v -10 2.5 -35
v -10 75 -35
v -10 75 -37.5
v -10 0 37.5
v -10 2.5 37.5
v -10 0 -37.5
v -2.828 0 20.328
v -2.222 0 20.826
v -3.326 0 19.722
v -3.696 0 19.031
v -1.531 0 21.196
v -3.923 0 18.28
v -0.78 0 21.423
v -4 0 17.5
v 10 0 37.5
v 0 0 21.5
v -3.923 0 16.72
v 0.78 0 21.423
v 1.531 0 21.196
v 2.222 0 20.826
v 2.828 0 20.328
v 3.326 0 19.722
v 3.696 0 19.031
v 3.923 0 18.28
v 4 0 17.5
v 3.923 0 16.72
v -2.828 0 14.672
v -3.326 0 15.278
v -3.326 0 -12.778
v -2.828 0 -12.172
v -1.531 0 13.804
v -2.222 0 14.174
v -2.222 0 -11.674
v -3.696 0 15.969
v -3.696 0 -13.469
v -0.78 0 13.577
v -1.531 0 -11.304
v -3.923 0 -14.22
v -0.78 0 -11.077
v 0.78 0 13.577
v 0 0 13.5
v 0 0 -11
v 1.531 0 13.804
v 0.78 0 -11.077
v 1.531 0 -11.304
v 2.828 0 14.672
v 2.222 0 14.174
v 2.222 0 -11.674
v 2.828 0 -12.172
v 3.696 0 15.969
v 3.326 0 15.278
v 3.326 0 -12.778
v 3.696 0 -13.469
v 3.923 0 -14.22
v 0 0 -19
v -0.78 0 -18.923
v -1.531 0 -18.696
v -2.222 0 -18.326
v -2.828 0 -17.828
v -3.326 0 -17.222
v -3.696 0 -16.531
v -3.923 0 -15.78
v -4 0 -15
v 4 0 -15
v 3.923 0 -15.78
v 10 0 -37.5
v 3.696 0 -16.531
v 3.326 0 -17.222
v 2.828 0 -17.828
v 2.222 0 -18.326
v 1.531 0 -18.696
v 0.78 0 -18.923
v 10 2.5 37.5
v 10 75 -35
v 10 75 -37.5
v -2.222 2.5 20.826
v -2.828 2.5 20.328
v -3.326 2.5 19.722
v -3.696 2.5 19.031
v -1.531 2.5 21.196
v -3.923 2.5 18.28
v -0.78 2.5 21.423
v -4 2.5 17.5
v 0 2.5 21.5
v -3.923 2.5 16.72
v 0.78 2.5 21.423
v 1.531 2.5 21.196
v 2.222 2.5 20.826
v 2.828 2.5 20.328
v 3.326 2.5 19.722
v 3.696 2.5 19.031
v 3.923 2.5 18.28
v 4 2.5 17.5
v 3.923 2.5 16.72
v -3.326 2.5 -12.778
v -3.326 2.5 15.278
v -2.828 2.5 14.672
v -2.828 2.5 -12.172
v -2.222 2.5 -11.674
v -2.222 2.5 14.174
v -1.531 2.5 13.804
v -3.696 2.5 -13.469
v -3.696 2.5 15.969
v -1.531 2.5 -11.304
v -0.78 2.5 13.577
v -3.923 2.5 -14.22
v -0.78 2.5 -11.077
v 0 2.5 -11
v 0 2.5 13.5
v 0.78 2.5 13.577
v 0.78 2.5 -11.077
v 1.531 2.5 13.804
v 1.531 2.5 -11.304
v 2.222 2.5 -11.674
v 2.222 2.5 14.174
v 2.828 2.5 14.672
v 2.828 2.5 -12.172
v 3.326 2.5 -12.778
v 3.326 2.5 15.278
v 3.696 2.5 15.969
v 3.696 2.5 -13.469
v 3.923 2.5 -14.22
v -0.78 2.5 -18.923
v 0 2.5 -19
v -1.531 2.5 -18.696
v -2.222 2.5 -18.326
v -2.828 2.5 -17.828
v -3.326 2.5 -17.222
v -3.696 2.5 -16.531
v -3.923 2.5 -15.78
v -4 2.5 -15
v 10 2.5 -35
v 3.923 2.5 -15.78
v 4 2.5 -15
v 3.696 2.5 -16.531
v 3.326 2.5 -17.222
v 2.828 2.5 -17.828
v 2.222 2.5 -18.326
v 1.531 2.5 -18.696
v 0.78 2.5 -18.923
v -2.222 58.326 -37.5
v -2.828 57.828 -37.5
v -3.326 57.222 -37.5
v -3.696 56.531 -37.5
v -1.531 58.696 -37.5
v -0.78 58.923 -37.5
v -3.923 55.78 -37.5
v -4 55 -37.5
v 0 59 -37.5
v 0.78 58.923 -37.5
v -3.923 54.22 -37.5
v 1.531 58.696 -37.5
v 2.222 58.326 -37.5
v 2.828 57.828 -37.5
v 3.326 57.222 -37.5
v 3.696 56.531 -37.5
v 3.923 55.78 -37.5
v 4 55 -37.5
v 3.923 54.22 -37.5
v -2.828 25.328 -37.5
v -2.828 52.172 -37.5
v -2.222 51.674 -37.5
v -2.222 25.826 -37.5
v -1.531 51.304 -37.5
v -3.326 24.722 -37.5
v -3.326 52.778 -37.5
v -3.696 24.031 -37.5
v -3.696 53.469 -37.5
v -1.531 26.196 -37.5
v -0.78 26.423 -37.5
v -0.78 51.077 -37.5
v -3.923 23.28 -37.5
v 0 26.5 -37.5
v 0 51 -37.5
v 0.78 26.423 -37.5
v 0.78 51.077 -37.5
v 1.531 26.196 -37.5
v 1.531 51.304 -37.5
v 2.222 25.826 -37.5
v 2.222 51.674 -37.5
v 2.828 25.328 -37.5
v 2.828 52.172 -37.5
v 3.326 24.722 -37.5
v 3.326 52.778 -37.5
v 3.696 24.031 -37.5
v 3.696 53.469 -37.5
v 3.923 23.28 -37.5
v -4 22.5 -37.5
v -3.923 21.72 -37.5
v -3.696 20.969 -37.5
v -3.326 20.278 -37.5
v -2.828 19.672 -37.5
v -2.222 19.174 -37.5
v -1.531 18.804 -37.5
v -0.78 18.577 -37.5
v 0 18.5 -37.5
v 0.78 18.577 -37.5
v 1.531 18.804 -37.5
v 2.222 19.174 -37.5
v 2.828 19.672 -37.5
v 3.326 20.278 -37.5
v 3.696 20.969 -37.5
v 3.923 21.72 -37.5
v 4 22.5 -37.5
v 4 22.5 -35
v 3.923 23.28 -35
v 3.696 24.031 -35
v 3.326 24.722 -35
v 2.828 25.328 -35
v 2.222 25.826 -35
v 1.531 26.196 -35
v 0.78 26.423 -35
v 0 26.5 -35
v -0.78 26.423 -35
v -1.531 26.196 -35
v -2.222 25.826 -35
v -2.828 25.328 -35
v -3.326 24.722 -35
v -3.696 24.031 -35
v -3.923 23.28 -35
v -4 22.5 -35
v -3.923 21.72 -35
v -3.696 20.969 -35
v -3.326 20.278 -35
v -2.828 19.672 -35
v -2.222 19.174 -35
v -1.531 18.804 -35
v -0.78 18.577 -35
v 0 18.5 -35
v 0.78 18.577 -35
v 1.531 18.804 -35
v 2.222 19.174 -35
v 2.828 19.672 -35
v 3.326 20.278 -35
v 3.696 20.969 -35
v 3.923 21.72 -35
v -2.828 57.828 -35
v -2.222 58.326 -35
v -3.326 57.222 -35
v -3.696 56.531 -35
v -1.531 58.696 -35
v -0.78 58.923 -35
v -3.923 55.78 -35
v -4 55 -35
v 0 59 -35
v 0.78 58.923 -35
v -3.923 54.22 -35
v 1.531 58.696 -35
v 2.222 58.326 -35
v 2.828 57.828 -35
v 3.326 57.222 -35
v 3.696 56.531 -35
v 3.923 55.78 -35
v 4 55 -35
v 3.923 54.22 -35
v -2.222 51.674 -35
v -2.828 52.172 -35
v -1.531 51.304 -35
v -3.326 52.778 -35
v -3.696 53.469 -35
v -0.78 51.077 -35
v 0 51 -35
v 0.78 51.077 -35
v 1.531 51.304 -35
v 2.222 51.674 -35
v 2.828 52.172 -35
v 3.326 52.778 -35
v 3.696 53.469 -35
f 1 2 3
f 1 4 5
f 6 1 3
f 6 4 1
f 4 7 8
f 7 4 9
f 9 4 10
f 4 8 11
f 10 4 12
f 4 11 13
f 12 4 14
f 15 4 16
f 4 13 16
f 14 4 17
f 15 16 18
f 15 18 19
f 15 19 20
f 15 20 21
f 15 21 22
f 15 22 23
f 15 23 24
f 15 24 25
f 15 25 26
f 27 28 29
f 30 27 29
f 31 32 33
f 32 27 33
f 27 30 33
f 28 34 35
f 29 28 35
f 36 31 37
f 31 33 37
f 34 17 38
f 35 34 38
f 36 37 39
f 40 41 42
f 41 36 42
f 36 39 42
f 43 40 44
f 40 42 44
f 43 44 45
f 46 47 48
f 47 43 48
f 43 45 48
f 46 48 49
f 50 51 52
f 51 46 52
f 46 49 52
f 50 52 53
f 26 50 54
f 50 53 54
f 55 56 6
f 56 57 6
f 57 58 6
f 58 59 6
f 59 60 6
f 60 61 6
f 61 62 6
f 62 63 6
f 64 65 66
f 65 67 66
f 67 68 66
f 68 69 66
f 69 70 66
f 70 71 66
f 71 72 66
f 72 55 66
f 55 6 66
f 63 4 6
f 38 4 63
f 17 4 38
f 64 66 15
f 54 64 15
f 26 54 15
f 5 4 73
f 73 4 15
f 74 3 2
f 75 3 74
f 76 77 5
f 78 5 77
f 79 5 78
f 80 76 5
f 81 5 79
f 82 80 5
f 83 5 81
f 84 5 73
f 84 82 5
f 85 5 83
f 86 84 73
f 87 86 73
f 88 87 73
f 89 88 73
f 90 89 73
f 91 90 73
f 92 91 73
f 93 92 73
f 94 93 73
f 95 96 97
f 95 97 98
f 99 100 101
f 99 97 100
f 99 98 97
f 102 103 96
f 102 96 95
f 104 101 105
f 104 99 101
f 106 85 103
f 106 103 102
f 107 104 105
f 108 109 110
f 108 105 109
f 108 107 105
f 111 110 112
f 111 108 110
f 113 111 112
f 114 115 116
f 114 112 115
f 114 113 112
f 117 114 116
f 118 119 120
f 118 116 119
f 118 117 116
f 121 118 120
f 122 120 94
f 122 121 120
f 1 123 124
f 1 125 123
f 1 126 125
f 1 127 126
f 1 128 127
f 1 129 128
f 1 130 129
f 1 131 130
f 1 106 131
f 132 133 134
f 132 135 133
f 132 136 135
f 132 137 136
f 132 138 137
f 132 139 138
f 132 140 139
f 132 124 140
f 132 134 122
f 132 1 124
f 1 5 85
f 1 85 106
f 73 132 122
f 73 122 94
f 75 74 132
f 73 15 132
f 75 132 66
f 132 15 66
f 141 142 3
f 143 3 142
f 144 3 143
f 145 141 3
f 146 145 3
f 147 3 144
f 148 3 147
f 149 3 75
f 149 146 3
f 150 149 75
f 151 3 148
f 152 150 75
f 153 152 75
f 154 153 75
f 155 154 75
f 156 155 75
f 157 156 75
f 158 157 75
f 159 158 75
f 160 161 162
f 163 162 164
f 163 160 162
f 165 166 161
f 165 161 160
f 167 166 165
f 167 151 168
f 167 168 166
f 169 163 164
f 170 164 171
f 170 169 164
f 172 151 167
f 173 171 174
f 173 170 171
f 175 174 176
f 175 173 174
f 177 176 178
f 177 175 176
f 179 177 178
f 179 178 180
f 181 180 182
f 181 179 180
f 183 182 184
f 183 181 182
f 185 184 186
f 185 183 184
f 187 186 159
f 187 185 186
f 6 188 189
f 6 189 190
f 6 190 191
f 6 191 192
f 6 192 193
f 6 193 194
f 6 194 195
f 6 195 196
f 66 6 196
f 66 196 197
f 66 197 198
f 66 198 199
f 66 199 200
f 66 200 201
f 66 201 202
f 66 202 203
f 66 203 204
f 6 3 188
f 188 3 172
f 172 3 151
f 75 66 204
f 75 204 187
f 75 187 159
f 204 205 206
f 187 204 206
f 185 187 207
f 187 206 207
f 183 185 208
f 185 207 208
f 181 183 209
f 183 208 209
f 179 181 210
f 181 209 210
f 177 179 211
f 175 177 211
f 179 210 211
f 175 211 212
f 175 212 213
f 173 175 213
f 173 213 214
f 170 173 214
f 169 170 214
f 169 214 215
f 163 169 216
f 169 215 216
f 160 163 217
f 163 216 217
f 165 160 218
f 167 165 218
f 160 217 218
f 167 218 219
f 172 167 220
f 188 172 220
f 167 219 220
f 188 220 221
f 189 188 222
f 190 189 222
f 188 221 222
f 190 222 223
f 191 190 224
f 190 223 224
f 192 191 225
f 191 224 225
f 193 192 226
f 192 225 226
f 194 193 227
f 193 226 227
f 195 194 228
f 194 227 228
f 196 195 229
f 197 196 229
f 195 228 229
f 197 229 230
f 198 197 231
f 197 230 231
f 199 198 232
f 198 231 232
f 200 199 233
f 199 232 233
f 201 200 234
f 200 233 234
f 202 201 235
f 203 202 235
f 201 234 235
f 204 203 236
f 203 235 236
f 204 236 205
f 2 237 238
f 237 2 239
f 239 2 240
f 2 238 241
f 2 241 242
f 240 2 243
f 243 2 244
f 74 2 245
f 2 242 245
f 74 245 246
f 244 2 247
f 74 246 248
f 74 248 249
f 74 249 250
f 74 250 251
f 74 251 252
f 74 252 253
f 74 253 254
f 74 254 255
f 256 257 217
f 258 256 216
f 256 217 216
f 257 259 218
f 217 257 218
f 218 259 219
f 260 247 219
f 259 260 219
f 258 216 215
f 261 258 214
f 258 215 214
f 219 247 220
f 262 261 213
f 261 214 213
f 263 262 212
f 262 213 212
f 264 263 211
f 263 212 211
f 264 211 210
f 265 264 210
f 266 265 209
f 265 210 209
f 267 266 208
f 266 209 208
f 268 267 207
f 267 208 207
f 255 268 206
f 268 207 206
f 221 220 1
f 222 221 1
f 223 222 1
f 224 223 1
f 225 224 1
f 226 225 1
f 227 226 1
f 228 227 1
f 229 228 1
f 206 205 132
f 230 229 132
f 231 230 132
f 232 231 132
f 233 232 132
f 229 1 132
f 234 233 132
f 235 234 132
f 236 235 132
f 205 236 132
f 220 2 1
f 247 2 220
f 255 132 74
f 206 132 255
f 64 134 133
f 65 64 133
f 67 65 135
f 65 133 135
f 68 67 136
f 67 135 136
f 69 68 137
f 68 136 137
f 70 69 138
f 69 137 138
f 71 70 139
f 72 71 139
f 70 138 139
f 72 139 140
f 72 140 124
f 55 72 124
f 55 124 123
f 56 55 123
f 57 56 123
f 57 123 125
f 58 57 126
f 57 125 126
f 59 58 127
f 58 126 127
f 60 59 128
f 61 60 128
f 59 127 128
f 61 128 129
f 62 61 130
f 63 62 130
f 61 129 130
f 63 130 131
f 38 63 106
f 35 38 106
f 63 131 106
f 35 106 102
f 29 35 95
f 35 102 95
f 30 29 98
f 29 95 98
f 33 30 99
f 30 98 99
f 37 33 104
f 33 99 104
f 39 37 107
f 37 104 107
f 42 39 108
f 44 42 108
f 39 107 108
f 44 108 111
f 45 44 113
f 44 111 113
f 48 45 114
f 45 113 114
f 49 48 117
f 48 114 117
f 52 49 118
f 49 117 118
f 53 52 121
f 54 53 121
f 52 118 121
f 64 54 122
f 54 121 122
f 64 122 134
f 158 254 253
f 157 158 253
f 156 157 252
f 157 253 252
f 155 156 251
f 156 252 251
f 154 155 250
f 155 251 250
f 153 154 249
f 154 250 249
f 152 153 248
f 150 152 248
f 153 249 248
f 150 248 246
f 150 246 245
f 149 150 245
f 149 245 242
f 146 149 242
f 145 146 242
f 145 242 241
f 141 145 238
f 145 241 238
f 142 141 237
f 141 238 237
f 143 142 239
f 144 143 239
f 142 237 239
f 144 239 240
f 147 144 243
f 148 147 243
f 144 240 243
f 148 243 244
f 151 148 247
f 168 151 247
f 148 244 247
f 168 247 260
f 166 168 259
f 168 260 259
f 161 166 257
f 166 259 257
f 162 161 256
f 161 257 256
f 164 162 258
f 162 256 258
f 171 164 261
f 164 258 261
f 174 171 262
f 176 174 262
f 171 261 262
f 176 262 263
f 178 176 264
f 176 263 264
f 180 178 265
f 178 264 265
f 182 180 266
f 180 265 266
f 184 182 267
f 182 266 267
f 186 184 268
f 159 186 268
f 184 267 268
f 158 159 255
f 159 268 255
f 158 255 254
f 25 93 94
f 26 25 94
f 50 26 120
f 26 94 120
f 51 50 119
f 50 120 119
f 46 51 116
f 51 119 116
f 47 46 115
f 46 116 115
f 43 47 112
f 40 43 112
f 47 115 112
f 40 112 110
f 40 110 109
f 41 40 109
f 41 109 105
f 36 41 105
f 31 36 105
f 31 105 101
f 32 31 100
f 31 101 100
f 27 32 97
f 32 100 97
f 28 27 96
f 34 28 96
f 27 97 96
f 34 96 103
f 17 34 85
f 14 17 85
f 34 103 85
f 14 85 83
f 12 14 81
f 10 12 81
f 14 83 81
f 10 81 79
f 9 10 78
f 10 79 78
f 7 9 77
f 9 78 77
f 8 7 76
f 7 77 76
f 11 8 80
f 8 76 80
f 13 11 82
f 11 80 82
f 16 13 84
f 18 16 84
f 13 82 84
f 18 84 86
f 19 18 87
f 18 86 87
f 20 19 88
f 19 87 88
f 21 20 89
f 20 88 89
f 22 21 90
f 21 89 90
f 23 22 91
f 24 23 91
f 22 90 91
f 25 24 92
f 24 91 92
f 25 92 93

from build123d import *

# Parameters (mm, degrees)
SKETCH1_W           = 20
SKETCH1_H           = 75
BOSS_EXTRUDE1_DEPTH = 2.5
SKETCH2_W           = 20
SKETCH2_H           = 2.5
BOSS_EXTRUDE2_DEPTH = 72.5
SKETCH3_R           = 4
CUT_EXTRUDE1_DEPTH  = 2.5
SKETCH4_R           = 4
CUT_EXTRUDE2_DEPTH  = 2.5


with BuildPart() as part:
    # Sketch1 → Boss-Extrude1 (new body)
    with BuildSketch(Plane(origin=(0, 0, 0), x_dir=(1, 0, 0), z_dir=(0, 1, 0))):
        Rectangle(SKETCH1_W, SKETCH1_H)
    extrude(amount=BOSS_EXTRUDE1_DEPTH)

    # Sketch2 → Boss-Extrude2 (add)
    with BuildSketch(Plane(origin=(0, 2.5, 0), x_dir=(1, 0, 0), z_dir=(0, 1, 0))):
        with Locations((0, 36.25)):
            Rectangle(SKETCH2_W, SKETCH2_H)
    extrude(amount=BOSS_EXTRUDE2_DEPTH)

    # Sketch3 → Cut-Extrude1 (cut)
    with BuildSketch(Plane(origin=(0, 2.5, 0), x_dir=(1, 0, 0), z_dir=(0, 1, 0))):
        with Locations((0, 15)):
            Circle(SKETCH3_R)
        with Locations((0, -17.5)):
            Circle(SKETCH3_R)
    extrude(amount=-CUT_EXTRUDE1_DEPTH, mode=Mode.SUBTRACT)

    # Sketch4 → Cut-Extrude2 (cut)
    with BuildSketch(Plane.XY.offset(-35)):
        with Locations((0, 55)):
            Circle(SKETCH4_R)
        with Locations((0, 22.5)):
            Circle(SKETCH4_R)
    extrude(amount=-CUT_EXTRUDE2_DEPTH, mode=Mode.SUBTRACT)


solid = part.part
